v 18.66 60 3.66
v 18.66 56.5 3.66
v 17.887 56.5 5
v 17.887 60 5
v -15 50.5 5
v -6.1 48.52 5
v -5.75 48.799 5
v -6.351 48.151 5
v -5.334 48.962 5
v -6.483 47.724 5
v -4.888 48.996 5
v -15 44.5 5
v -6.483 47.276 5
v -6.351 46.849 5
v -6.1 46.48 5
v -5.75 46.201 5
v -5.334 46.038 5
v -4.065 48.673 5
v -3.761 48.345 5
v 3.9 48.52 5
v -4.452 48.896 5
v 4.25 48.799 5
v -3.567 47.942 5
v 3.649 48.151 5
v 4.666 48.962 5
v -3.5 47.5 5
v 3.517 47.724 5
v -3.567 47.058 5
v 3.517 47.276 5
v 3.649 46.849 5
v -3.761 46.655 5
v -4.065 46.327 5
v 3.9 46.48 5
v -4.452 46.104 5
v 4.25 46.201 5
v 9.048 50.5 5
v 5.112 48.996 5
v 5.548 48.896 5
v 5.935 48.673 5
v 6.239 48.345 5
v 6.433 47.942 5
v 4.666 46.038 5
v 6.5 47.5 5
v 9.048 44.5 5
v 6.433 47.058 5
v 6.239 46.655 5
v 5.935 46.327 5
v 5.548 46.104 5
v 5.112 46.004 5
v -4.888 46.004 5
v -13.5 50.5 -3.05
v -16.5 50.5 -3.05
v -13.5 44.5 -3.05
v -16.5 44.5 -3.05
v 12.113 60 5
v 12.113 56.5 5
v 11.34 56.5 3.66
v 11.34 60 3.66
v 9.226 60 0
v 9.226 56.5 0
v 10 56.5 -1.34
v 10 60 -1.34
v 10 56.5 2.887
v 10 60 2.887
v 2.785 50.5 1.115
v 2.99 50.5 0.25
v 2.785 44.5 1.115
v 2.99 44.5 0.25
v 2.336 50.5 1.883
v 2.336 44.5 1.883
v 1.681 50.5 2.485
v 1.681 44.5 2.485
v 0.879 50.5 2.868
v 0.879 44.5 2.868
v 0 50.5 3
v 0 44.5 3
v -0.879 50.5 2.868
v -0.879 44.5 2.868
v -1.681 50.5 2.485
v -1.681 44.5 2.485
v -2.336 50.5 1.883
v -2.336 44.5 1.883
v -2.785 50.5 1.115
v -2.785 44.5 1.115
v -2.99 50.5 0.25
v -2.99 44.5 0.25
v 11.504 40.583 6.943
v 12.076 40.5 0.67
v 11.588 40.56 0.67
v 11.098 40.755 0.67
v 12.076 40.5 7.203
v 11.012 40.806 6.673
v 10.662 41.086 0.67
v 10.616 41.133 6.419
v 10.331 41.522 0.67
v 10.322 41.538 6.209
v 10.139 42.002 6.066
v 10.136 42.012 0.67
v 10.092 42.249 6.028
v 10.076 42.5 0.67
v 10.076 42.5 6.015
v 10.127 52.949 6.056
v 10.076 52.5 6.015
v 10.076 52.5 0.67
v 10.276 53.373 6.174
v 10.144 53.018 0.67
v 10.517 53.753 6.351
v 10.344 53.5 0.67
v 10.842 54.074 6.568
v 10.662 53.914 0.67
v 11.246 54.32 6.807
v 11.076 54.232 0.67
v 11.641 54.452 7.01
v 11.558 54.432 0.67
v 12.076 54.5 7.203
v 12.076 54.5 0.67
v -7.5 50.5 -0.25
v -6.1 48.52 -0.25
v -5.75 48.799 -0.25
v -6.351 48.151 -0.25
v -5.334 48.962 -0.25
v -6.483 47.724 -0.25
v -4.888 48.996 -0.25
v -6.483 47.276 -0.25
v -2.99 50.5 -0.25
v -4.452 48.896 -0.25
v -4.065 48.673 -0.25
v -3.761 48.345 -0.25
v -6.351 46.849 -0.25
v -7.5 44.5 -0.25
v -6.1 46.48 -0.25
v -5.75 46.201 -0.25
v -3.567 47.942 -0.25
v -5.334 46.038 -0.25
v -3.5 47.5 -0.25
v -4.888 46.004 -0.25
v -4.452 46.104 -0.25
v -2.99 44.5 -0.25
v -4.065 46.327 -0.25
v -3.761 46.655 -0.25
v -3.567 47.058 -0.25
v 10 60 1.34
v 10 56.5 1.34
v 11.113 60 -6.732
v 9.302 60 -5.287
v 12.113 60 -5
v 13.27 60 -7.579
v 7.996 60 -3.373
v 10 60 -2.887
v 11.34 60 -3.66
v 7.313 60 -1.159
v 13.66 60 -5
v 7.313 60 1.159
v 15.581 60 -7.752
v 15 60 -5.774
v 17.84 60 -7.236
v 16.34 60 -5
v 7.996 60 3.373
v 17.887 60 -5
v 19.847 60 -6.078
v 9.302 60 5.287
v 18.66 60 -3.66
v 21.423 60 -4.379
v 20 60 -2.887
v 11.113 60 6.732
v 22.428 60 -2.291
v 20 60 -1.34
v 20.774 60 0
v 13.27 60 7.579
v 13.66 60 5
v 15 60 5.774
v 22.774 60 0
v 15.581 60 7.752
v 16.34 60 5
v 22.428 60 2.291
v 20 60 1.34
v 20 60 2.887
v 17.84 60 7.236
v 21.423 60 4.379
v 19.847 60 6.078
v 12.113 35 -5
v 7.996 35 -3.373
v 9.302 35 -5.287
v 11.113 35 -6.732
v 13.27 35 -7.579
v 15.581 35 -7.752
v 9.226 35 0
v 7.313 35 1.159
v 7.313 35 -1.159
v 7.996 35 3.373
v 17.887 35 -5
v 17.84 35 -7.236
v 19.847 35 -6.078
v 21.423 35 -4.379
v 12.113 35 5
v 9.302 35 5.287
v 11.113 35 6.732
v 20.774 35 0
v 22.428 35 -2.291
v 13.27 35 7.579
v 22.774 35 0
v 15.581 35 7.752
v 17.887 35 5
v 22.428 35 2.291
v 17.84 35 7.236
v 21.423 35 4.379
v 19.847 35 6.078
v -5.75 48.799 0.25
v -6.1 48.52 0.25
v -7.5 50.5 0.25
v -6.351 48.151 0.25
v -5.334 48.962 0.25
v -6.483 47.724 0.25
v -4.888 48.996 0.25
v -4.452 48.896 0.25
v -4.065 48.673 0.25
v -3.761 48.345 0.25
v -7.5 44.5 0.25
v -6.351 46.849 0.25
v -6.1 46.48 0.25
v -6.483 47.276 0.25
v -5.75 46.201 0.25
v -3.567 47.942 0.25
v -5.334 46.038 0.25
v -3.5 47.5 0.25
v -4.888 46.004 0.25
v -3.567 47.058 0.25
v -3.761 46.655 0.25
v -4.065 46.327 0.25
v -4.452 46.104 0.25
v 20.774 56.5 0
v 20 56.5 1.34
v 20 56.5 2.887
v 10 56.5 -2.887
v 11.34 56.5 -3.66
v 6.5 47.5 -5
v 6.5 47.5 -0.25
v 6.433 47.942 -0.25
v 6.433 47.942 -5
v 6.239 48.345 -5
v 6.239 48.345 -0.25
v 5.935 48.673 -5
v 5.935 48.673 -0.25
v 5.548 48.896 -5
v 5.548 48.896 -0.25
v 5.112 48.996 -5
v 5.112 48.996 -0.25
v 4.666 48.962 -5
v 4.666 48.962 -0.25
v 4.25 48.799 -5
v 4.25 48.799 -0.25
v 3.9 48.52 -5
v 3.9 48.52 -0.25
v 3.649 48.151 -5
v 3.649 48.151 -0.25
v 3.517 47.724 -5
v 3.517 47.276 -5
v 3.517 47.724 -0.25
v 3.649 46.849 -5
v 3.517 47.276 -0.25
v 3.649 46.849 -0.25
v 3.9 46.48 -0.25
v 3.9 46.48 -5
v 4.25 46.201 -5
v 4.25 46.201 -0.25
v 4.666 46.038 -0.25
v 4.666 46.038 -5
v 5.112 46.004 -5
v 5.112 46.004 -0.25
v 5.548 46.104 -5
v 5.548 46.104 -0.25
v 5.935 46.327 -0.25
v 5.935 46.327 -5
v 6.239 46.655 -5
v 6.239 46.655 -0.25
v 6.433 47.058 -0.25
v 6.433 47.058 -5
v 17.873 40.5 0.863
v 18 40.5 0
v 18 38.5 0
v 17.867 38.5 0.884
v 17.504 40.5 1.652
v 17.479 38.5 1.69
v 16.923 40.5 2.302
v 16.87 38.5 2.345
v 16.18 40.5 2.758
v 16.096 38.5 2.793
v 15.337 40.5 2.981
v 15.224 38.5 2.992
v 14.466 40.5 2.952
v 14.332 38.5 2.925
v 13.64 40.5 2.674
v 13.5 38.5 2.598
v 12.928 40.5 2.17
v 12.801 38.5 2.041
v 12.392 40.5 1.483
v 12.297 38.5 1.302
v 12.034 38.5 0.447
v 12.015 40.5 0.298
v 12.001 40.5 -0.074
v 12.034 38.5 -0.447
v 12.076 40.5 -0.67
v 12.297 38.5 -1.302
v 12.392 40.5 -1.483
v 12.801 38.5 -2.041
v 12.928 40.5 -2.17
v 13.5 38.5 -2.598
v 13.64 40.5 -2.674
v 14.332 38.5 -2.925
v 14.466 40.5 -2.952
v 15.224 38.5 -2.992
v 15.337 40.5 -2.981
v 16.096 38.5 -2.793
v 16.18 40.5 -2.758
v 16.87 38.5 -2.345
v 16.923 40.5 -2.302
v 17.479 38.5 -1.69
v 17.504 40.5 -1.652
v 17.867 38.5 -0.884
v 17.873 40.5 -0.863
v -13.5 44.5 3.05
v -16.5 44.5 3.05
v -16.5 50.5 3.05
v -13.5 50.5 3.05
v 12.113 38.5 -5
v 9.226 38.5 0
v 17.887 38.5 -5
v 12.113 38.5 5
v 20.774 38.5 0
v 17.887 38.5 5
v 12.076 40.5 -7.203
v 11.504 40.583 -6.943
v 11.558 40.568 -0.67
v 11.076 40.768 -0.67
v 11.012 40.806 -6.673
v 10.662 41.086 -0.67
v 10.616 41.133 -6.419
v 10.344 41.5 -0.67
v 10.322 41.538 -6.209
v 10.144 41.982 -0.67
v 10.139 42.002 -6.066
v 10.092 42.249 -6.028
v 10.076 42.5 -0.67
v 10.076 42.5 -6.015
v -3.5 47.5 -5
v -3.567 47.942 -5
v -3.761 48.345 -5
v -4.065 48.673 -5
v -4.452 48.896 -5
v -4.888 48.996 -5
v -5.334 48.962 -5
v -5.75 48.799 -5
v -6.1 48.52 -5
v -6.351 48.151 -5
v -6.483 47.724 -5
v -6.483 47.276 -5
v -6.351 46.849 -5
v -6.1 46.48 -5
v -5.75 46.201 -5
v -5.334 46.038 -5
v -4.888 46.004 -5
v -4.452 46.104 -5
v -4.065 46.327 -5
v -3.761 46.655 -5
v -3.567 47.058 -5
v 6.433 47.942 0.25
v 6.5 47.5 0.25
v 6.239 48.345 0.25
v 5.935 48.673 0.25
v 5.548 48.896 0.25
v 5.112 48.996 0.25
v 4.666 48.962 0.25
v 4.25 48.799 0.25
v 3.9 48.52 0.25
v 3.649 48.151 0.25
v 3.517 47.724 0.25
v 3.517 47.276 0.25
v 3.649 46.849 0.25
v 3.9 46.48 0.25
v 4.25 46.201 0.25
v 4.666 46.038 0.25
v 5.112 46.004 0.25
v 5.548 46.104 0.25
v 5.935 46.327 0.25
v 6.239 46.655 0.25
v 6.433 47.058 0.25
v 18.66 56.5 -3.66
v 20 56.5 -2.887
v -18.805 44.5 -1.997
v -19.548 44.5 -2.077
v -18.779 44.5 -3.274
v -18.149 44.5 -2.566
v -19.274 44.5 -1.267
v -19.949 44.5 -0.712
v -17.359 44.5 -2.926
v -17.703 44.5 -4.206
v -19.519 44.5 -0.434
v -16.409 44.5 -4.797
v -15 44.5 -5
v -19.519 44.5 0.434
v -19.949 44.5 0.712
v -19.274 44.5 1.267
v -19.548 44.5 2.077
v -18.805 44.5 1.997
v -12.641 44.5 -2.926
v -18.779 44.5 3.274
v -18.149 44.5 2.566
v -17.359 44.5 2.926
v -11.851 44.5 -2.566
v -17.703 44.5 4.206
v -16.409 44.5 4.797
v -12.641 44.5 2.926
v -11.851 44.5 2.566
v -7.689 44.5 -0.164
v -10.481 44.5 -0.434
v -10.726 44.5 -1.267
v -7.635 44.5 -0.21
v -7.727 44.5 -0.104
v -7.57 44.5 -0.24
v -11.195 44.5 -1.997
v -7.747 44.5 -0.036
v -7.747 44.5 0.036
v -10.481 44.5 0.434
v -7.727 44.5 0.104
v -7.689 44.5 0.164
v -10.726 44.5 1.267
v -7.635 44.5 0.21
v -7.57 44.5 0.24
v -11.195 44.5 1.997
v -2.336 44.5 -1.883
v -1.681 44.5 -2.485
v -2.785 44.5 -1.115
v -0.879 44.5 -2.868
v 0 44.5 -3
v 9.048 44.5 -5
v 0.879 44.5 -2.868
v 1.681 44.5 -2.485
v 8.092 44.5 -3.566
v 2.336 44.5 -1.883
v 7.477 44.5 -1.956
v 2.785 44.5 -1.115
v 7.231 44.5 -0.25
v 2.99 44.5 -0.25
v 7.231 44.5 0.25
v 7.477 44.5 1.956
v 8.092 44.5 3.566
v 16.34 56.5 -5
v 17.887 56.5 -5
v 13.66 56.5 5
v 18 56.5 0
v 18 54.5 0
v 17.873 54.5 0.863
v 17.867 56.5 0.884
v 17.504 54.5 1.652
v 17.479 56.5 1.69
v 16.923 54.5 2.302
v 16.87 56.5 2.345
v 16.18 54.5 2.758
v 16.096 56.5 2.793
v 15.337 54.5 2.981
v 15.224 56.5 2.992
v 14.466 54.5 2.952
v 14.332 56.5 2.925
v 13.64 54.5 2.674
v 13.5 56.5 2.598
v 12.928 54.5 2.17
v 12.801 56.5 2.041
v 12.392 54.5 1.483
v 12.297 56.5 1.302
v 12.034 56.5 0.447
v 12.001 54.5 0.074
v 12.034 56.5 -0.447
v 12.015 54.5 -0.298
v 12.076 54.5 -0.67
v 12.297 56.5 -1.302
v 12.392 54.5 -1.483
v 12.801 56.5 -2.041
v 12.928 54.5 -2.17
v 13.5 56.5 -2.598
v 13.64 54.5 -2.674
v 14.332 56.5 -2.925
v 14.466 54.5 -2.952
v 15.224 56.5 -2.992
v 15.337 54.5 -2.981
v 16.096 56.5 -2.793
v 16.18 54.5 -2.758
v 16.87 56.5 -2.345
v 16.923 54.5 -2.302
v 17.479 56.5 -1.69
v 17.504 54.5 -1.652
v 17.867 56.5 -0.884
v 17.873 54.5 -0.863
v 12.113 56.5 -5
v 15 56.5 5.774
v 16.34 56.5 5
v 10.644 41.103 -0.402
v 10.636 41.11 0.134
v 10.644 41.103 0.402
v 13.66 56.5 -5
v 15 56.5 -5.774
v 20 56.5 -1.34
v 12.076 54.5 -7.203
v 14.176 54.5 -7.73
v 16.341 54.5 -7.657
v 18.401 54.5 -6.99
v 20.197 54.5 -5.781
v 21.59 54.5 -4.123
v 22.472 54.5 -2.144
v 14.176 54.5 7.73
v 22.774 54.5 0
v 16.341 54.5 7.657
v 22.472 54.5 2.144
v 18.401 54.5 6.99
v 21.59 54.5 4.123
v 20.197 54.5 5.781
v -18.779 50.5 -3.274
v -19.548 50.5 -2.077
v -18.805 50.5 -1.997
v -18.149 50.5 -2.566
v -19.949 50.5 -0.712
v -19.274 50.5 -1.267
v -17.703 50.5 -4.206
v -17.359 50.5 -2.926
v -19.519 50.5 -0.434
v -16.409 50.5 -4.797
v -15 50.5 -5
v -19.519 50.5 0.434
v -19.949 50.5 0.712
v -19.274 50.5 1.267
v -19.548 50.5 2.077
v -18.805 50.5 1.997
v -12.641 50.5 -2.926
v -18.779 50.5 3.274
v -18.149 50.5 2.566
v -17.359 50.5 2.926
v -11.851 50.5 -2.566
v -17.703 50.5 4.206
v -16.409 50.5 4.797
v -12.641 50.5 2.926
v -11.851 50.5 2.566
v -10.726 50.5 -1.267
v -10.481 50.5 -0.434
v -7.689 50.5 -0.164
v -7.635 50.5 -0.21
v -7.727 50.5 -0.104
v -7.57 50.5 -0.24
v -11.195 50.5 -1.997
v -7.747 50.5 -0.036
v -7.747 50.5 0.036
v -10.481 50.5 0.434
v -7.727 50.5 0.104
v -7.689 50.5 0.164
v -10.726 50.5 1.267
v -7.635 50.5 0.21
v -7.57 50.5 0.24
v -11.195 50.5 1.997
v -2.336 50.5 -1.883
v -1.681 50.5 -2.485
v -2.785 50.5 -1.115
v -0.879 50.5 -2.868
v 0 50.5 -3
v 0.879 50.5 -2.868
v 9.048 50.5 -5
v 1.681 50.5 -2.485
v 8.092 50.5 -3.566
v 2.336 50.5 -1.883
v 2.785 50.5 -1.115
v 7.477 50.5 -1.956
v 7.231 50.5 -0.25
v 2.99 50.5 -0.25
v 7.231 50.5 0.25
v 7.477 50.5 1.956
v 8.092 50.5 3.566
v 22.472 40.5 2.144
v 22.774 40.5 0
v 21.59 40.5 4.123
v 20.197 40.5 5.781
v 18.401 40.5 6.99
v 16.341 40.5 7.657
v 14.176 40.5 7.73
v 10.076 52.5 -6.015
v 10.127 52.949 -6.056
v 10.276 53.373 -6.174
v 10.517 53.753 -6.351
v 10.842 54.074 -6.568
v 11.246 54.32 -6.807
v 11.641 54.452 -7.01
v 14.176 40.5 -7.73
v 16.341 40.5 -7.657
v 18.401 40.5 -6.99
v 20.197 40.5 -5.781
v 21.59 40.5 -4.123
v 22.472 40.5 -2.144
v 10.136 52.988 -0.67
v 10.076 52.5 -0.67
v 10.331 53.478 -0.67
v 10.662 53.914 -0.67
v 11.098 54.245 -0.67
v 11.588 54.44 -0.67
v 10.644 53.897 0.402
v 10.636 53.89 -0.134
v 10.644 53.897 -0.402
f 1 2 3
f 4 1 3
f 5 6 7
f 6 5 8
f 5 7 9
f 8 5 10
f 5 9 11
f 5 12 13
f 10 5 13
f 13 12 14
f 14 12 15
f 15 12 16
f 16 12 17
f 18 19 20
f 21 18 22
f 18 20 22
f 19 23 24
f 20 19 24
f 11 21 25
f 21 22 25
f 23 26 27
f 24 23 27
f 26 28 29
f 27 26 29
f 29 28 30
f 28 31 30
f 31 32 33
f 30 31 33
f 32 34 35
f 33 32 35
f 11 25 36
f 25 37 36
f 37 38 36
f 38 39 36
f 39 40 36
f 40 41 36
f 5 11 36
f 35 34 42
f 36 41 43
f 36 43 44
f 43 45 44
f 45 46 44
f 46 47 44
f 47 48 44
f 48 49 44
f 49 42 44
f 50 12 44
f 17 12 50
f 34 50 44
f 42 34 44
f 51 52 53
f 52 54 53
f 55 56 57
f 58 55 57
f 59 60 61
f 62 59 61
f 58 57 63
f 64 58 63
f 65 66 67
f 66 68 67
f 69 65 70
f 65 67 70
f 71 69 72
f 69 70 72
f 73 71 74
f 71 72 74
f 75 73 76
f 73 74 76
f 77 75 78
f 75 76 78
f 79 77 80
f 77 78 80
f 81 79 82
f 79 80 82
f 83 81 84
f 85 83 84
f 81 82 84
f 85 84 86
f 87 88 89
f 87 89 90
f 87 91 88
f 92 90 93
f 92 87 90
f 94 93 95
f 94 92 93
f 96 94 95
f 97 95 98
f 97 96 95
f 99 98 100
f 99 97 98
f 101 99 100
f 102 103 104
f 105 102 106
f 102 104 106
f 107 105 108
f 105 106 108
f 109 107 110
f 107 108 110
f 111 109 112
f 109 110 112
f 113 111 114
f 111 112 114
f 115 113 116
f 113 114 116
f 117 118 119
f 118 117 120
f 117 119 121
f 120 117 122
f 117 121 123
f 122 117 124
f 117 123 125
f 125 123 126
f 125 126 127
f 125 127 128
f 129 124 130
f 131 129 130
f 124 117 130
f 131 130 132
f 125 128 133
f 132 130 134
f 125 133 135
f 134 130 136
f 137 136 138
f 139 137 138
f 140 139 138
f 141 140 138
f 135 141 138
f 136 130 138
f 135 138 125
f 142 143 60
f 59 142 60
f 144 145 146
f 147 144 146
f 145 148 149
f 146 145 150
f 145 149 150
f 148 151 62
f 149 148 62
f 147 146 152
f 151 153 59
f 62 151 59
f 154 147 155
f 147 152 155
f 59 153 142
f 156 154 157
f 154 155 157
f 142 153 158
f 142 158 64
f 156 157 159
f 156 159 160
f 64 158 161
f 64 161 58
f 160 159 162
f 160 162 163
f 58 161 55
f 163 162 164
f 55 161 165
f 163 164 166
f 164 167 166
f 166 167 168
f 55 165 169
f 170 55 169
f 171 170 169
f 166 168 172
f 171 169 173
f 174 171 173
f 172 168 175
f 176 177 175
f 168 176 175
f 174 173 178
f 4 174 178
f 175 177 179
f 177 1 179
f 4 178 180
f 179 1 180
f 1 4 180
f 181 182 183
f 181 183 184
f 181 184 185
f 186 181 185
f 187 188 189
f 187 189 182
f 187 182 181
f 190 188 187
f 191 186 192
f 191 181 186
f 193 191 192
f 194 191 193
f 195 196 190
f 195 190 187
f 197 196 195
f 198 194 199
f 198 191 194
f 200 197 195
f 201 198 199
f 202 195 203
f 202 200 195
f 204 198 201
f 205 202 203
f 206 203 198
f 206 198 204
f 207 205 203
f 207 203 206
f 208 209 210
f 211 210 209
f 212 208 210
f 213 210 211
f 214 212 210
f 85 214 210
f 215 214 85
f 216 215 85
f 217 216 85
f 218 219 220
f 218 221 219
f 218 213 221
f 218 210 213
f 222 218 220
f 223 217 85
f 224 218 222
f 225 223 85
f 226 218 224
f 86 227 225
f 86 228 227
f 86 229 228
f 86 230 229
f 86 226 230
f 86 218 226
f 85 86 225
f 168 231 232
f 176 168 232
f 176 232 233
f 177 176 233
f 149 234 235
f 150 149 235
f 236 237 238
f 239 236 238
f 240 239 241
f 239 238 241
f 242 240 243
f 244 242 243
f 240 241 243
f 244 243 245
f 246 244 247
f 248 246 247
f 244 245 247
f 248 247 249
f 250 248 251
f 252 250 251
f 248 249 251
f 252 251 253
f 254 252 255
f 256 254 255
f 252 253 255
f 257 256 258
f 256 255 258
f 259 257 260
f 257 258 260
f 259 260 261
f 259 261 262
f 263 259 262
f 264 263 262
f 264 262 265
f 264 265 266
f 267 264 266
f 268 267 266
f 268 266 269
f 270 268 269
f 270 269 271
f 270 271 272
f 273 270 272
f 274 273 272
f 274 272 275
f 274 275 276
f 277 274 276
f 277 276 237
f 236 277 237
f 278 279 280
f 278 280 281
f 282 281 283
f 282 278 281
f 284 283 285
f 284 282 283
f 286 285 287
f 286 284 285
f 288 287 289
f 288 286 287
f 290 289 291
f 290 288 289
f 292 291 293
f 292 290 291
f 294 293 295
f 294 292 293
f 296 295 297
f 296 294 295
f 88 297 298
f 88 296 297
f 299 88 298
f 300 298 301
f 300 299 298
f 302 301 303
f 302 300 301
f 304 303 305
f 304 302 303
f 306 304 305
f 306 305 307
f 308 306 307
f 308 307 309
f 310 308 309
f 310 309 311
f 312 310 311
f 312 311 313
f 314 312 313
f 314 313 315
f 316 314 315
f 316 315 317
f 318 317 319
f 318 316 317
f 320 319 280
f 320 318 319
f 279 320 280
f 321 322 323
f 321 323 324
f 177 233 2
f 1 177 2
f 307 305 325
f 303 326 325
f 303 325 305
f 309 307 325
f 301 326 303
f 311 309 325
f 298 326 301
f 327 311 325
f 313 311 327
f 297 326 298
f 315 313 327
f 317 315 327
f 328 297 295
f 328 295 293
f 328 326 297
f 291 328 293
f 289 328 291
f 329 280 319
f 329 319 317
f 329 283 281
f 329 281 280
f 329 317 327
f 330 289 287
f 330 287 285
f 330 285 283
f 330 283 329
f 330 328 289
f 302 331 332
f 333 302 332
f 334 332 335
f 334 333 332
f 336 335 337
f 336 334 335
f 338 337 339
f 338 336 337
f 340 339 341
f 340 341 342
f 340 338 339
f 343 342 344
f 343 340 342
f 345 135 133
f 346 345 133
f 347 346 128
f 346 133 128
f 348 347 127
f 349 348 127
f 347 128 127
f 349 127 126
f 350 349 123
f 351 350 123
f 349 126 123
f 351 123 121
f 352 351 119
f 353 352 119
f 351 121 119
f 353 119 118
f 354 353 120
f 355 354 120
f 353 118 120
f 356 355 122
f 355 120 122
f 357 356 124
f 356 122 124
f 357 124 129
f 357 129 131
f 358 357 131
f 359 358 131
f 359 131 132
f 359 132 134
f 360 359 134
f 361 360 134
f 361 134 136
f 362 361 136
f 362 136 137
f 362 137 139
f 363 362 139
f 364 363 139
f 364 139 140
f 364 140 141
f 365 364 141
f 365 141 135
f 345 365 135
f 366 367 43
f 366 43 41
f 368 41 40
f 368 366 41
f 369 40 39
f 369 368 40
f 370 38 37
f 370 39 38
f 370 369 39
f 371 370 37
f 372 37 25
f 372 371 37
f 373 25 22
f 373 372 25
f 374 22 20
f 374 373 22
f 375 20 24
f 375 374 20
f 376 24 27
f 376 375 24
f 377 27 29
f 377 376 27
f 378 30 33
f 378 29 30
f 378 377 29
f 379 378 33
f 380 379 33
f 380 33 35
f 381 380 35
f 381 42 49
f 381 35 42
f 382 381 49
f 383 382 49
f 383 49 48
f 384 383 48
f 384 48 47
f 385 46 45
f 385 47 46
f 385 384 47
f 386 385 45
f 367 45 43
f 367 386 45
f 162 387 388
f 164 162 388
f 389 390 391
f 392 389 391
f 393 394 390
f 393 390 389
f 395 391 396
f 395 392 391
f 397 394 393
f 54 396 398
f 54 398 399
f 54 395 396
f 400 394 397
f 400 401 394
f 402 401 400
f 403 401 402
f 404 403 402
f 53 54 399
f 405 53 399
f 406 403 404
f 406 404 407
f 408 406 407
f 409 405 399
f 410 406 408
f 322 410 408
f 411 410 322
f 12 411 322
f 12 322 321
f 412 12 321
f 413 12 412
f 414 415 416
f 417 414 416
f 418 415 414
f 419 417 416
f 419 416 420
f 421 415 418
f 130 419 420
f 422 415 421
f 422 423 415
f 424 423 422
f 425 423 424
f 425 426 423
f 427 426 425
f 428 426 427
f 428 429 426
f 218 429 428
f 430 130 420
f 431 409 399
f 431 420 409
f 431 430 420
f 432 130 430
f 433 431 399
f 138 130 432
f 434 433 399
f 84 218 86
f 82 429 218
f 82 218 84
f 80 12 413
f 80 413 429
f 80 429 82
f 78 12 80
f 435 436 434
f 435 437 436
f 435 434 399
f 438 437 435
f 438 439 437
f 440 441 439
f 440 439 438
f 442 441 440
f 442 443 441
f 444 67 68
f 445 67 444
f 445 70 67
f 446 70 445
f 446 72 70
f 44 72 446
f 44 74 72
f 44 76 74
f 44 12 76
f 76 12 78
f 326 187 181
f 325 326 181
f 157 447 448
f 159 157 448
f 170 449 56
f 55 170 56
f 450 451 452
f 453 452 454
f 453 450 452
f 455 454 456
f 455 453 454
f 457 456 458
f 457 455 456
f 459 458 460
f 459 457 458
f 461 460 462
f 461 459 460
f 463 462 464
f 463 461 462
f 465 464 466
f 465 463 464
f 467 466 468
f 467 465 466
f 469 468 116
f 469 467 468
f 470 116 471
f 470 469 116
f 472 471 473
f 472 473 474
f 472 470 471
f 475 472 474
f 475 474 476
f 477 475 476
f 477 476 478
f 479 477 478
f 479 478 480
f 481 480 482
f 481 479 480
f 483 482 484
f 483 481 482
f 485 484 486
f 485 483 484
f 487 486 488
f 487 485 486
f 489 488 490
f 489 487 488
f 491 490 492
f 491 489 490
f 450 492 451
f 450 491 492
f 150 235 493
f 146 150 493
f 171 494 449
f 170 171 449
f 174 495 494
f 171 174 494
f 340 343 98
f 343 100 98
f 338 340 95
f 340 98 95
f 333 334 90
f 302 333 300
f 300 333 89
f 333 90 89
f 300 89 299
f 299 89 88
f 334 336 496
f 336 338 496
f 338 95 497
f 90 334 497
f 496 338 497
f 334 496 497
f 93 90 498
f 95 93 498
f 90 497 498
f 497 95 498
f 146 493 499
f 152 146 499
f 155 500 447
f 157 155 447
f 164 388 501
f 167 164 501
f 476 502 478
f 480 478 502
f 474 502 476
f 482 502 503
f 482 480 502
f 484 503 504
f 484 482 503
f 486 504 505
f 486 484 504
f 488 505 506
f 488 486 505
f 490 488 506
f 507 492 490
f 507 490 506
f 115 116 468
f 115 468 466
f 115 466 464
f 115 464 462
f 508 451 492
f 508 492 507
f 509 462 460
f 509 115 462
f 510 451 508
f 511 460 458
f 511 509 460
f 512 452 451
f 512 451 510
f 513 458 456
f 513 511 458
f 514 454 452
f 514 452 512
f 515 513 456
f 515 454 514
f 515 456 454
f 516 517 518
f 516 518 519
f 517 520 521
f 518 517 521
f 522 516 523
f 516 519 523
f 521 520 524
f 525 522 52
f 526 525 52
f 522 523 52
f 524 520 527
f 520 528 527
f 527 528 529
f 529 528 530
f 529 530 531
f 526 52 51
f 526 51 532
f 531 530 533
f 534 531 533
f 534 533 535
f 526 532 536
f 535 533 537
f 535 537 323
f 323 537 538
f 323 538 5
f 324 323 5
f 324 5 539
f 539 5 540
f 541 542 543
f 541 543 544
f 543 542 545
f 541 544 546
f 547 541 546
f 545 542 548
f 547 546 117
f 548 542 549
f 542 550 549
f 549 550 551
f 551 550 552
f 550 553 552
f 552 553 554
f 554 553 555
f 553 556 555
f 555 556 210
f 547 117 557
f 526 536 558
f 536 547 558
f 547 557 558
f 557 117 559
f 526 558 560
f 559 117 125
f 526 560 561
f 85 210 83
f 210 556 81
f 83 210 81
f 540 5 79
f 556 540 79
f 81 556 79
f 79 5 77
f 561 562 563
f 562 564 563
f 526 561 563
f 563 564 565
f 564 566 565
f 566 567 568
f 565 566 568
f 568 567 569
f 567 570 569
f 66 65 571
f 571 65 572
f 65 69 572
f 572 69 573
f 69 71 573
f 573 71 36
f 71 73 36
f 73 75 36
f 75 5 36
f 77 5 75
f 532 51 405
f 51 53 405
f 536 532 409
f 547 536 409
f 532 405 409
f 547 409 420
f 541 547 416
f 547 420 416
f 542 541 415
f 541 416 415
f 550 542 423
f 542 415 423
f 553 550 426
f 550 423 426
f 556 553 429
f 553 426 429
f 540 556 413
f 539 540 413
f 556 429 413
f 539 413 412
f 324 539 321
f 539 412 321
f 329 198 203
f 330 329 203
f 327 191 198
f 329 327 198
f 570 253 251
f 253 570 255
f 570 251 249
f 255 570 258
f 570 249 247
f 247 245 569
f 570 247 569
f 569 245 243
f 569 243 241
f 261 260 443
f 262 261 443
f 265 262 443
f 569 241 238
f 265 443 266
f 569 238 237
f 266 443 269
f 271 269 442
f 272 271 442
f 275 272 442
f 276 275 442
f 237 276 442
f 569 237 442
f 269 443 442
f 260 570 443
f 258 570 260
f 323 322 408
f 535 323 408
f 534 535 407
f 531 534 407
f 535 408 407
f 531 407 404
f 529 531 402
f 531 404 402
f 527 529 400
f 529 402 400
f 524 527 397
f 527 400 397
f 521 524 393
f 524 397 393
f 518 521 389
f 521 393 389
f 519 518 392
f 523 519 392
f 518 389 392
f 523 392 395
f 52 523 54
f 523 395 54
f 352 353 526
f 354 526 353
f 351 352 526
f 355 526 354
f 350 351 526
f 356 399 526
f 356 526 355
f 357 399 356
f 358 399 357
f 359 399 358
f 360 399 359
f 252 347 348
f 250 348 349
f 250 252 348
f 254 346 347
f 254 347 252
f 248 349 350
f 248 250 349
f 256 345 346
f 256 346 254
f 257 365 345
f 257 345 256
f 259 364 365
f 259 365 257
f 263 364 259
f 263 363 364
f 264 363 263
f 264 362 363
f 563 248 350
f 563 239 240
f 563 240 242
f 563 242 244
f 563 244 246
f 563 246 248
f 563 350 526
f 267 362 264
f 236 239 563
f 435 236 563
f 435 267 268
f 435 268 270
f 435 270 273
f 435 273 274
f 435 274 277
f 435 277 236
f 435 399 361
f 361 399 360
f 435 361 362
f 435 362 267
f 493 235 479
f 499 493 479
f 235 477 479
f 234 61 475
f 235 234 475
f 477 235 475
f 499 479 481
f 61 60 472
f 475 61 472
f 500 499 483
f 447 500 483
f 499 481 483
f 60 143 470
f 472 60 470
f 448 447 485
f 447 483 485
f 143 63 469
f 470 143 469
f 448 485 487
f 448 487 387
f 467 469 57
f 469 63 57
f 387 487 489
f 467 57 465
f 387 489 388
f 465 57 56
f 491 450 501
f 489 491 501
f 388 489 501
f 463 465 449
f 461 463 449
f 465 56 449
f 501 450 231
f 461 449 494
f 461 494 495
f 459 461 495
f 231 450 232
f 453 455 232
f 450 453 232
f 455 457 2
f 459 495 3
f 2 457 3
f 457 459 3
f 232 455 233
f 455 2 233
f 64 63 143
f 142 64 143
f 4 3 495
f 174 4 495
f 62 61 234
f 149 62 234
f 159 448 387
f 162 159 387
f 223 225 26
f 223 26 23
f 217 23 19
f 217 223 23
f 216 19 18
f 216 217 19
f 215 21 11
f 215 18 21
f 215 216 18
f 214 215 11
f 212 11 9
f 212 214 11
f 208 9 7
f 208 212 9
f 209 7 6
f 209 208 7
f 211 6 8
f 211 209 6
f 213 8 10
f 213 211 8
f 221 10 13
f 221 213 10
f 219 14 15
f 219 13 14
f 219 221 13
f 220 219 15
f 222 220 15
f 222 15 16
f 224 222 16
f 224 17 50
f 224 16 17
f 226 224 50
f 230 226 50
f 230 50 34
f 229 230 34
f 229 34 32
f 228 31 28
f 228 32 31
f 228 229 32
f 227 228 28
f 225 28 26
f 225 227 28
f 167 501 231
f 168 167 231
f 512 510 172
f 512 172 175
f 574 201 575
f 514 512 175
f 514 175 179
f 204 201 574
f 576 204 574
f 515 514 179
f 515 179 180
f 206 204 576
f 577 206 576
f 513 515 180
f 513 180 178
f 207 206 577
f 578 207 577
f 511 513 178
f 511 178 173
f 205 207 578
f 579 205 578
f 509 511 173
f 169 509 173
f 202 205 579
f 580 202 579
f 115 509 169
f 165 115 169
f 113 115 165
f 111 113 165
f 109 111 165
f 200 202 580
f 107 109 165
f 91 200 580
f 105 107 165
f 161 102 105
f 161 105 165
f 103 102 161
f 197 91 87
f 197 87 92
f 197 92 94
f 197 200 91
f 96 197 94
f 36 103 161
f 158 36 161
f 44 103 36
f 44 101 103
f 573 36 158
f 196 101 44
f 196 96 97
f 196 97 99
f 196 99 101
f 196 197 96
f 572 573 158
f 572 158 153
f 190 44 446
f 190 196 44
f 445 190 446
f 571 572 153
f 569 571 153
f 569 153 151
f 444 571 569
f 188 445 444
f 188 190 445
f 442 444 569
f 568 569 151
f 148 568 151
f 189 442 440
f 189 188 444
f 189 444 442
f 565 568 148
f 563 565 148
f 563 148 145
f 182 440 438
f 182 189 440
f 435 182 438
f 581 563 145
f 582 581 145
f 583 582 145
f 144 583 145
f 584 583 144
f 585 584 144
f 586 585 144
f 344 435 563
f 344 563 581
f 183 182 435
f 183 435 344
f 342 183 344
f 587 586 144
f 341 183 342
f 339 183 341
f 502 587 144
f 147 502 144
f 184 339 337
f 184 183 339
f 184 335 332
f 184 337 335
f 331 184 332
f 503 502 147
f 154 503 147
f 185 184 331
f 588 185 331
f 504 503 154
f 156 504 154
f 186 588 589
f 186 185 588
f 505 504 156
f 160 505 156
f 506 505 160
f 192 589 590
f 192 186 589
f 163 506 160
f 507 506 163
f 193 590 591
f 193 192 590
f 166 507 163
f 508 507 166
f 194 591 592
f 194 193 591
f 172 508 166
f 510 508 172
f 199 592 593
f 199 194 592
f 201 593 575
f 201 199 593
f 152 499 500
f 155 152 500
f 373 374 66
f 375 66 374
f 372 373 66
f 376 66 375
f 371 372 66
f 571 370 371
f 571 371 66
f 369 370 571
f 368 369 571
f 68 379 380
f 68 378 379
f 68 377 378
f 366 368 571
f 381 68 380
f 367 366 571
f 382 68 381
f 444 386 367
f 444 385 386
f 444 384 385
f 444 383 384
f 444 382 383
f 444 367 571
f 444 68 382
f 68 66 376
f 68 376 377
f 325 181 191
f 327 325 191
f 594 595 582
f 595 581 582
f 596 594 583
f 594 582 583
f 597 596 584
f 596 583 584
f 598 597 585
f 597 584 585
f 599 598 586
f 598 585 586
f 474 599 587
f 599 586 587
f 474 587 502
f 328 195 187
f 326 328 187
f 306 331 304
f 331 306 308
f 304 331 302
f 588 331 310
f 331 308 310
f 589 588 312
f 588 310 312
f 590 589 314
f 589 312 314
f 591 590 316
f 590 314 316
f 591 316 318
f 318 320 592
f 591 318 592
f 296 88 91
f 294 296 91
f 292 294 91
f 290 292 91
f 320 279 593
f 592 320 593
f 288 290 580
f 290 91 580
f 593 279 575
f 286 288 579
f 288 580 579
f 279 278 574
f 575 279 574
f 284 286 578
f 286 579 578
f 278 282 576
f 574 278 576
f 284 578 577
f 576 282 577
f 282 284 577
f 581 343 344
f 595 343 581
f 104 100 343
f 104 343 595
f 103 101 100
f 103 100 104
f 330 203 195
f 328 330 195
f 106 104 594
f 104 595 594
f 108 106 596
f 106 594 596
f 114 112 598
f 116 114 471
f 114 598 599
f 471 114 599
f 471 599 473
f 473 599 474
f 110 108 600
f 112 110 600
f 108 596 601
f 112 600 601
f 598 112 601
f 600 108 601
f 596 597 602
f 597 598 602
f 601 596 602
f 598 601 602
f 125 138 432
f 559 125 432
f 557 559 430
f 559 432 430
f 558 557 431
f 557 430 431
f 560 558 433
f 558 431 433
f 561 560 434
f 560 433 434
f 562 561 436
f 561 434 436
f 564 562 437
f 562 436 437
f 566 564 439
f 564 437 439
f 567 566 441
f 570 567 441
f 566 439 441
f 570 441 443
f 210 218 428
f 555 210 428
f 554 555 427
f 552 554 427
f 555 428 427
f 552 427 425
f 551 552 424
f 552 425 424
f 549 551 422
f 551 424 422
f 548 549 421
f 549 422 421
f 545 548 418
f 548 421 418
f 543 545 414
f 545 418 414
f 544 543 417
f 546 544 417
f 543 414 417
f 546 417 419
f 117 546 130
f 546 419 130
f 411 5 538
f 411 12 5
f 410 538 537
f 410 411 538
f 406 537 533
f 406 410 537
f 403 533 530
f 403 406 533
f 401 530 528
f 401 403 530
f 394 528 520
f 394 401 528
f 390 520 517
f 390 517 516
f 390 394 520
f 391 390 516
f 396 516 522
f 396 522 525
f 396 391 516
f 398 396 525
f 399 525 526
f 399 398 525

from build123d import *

# Parameters (mm, degrees)
SKETCH012_R     = 3
PAD005_DEPTH    = 3
SKETCH013_R     = 7.773503
SKETCH013_R_2   = 3
PAD006_DEPTH    = 12.5
POCKET005_DEPTH = 2.5
POCKET006_DEPTH = 5
SKETCH016_R     = 1.5
SKETCH016_W     = 16.799735
SKETCH016_H     = 14
POCKET007_DEPTH = 10
FILLET_R        = 2


with BuildPart() as part:
    # Sketch012 → Pad005 (new body, symmetric)
    with BuildSketch(Plane.XZ):
        with BuildLine():
            ThreePointArc((-15, 5), (-20, 0), (-15, -5))
            Line((-15, -5), (9.047913, -5))
            ThreePointArc((9.047913, -5), (22.773503, 0), (9.047913, 5))
            Line((-15, 5), (9.047913, 5))
        make_face()
        with Locations((15, 0)):
            Circle(SKETCH012_R, mode=Mode.SUBTRACT)
        with BuildLine():
            ThreePointArc((-2.989565, -0.25), (0, -3), (2.989565, -0.25))
            Line((2.989565, -0.25), (7.5, -0.25))
            ThreePointArc((7.5, -0.25), (7.75, 0), (7.5, 0.25))
            Line((2.989565, 0.25), (7.5, 0.25))
            ThreePointArc((2.989565, 0.25), (0, 3), (-2.989565, 0.25))
            Line((-7.5, 0.25), (-2.989565, 0.25))
            ThreePointArc((-7.5, 0.25), (-7.75, 0), (-7.5, -0.25))
            Line((-7.5, -0.25), (-2.989565, -0.25))
        make_face(mode=Mode.SUBTRACT)
        with BuildLine():
            ThreePointArc((-16.5, 3.05), (-19.55, 0), (-16.5, -3.05))
            Line((-16.5, -3.05), (-13.5, -3.05))
            ThreePointArc((-13.5, -3.05), (-10.45, 0), (-13.5, 3.05))
            Line((-16.5, 3.05), (-13.5, 3.05))
        make_face(mode=Mode.SUBTRACT)
    extrude(amount=PAD005_DEPTH, both=True)

    # Sketch013 → Pad006 (join, symmetric)
    with BuildSketch(Plane.XZ):
        with Locations((15, 0)):
            Circle(SKETCH013_R)
        with Locations((15, 0)):
            Circle(SKETCH013_R_2, mode=Mode.SUBTRACT)
    extrude(amount=PAD006_DEPTH, both=True)

    # Sketch014 → Pocket005 (cut, symmetric)
    with BuildSketch(Plane.XZ.offset(11.5)):
        Polygon((17.886751, -5), (20.773503, 0), (17.886751, 5), (12.113249, 5), (9.226497, 0), (12.113249, -5), align=None)
    extrude(amount=POCKET005_DEPTH, both=True, mode=Mode.SUBTRACT)

    # Sketch015 → Pocket006 (cut)
    with BuildSketch(Plane.XZ.offset(-9)):
        Polygon((17.886751, -5), (18.660254, -3.660254), (20, -2.886751), (20, -1.339746), (20.773503, 0), (20, 1.339746), (20, 2.886751), (18.660254, 3.660254), (17.886751, 5), (16.339746, 5), (15, 5.773503), (13.660254, 5), (12.113249, 5), (11.339746, 3.660254), (10, 2.886751), (10, 1.339746), (9.226497, 0), (10, -1.339746), (10, -2.886751), (11.339746, -3.660254), (12.113249, -5), (13.660254, -5), (15, -5.773503), (16.339746, -5), align=None)
    extrude(amount=-POCKET006_DEPTH, mode=Mode.SUBTRACT)

    # Sketch016 → Pocket007 (cut, symmetric)
    with BuildSketch(Plane.XY):
        with Locations((-5, 0)):
            Circle(SKETCH016_R)
        with Locations((5, 0)):
            Circle(SKETCH016_R)
        with Locations((18.475649, 0)):
            Rectangle(SKETCH016_W, SKETCH016_H)
    extrude(amount=POCKET007_DEPTH, both=True, mode=Mode.SUBTRACT)

    # Fillet
    fillet_edges = [part.edges().sort_by_distance(p)[0] for p in [
        (10.075782, -7, 0),
        (10.075782, 7, 0),
    ]]
    fillet(fillet_edges, radius=FILLET_R)


with BuildPart() as part_1:
    # Body022 placement: moved
    add(part.part.moved(Location((0, 47.5, 0))))


solid = part_1.part
